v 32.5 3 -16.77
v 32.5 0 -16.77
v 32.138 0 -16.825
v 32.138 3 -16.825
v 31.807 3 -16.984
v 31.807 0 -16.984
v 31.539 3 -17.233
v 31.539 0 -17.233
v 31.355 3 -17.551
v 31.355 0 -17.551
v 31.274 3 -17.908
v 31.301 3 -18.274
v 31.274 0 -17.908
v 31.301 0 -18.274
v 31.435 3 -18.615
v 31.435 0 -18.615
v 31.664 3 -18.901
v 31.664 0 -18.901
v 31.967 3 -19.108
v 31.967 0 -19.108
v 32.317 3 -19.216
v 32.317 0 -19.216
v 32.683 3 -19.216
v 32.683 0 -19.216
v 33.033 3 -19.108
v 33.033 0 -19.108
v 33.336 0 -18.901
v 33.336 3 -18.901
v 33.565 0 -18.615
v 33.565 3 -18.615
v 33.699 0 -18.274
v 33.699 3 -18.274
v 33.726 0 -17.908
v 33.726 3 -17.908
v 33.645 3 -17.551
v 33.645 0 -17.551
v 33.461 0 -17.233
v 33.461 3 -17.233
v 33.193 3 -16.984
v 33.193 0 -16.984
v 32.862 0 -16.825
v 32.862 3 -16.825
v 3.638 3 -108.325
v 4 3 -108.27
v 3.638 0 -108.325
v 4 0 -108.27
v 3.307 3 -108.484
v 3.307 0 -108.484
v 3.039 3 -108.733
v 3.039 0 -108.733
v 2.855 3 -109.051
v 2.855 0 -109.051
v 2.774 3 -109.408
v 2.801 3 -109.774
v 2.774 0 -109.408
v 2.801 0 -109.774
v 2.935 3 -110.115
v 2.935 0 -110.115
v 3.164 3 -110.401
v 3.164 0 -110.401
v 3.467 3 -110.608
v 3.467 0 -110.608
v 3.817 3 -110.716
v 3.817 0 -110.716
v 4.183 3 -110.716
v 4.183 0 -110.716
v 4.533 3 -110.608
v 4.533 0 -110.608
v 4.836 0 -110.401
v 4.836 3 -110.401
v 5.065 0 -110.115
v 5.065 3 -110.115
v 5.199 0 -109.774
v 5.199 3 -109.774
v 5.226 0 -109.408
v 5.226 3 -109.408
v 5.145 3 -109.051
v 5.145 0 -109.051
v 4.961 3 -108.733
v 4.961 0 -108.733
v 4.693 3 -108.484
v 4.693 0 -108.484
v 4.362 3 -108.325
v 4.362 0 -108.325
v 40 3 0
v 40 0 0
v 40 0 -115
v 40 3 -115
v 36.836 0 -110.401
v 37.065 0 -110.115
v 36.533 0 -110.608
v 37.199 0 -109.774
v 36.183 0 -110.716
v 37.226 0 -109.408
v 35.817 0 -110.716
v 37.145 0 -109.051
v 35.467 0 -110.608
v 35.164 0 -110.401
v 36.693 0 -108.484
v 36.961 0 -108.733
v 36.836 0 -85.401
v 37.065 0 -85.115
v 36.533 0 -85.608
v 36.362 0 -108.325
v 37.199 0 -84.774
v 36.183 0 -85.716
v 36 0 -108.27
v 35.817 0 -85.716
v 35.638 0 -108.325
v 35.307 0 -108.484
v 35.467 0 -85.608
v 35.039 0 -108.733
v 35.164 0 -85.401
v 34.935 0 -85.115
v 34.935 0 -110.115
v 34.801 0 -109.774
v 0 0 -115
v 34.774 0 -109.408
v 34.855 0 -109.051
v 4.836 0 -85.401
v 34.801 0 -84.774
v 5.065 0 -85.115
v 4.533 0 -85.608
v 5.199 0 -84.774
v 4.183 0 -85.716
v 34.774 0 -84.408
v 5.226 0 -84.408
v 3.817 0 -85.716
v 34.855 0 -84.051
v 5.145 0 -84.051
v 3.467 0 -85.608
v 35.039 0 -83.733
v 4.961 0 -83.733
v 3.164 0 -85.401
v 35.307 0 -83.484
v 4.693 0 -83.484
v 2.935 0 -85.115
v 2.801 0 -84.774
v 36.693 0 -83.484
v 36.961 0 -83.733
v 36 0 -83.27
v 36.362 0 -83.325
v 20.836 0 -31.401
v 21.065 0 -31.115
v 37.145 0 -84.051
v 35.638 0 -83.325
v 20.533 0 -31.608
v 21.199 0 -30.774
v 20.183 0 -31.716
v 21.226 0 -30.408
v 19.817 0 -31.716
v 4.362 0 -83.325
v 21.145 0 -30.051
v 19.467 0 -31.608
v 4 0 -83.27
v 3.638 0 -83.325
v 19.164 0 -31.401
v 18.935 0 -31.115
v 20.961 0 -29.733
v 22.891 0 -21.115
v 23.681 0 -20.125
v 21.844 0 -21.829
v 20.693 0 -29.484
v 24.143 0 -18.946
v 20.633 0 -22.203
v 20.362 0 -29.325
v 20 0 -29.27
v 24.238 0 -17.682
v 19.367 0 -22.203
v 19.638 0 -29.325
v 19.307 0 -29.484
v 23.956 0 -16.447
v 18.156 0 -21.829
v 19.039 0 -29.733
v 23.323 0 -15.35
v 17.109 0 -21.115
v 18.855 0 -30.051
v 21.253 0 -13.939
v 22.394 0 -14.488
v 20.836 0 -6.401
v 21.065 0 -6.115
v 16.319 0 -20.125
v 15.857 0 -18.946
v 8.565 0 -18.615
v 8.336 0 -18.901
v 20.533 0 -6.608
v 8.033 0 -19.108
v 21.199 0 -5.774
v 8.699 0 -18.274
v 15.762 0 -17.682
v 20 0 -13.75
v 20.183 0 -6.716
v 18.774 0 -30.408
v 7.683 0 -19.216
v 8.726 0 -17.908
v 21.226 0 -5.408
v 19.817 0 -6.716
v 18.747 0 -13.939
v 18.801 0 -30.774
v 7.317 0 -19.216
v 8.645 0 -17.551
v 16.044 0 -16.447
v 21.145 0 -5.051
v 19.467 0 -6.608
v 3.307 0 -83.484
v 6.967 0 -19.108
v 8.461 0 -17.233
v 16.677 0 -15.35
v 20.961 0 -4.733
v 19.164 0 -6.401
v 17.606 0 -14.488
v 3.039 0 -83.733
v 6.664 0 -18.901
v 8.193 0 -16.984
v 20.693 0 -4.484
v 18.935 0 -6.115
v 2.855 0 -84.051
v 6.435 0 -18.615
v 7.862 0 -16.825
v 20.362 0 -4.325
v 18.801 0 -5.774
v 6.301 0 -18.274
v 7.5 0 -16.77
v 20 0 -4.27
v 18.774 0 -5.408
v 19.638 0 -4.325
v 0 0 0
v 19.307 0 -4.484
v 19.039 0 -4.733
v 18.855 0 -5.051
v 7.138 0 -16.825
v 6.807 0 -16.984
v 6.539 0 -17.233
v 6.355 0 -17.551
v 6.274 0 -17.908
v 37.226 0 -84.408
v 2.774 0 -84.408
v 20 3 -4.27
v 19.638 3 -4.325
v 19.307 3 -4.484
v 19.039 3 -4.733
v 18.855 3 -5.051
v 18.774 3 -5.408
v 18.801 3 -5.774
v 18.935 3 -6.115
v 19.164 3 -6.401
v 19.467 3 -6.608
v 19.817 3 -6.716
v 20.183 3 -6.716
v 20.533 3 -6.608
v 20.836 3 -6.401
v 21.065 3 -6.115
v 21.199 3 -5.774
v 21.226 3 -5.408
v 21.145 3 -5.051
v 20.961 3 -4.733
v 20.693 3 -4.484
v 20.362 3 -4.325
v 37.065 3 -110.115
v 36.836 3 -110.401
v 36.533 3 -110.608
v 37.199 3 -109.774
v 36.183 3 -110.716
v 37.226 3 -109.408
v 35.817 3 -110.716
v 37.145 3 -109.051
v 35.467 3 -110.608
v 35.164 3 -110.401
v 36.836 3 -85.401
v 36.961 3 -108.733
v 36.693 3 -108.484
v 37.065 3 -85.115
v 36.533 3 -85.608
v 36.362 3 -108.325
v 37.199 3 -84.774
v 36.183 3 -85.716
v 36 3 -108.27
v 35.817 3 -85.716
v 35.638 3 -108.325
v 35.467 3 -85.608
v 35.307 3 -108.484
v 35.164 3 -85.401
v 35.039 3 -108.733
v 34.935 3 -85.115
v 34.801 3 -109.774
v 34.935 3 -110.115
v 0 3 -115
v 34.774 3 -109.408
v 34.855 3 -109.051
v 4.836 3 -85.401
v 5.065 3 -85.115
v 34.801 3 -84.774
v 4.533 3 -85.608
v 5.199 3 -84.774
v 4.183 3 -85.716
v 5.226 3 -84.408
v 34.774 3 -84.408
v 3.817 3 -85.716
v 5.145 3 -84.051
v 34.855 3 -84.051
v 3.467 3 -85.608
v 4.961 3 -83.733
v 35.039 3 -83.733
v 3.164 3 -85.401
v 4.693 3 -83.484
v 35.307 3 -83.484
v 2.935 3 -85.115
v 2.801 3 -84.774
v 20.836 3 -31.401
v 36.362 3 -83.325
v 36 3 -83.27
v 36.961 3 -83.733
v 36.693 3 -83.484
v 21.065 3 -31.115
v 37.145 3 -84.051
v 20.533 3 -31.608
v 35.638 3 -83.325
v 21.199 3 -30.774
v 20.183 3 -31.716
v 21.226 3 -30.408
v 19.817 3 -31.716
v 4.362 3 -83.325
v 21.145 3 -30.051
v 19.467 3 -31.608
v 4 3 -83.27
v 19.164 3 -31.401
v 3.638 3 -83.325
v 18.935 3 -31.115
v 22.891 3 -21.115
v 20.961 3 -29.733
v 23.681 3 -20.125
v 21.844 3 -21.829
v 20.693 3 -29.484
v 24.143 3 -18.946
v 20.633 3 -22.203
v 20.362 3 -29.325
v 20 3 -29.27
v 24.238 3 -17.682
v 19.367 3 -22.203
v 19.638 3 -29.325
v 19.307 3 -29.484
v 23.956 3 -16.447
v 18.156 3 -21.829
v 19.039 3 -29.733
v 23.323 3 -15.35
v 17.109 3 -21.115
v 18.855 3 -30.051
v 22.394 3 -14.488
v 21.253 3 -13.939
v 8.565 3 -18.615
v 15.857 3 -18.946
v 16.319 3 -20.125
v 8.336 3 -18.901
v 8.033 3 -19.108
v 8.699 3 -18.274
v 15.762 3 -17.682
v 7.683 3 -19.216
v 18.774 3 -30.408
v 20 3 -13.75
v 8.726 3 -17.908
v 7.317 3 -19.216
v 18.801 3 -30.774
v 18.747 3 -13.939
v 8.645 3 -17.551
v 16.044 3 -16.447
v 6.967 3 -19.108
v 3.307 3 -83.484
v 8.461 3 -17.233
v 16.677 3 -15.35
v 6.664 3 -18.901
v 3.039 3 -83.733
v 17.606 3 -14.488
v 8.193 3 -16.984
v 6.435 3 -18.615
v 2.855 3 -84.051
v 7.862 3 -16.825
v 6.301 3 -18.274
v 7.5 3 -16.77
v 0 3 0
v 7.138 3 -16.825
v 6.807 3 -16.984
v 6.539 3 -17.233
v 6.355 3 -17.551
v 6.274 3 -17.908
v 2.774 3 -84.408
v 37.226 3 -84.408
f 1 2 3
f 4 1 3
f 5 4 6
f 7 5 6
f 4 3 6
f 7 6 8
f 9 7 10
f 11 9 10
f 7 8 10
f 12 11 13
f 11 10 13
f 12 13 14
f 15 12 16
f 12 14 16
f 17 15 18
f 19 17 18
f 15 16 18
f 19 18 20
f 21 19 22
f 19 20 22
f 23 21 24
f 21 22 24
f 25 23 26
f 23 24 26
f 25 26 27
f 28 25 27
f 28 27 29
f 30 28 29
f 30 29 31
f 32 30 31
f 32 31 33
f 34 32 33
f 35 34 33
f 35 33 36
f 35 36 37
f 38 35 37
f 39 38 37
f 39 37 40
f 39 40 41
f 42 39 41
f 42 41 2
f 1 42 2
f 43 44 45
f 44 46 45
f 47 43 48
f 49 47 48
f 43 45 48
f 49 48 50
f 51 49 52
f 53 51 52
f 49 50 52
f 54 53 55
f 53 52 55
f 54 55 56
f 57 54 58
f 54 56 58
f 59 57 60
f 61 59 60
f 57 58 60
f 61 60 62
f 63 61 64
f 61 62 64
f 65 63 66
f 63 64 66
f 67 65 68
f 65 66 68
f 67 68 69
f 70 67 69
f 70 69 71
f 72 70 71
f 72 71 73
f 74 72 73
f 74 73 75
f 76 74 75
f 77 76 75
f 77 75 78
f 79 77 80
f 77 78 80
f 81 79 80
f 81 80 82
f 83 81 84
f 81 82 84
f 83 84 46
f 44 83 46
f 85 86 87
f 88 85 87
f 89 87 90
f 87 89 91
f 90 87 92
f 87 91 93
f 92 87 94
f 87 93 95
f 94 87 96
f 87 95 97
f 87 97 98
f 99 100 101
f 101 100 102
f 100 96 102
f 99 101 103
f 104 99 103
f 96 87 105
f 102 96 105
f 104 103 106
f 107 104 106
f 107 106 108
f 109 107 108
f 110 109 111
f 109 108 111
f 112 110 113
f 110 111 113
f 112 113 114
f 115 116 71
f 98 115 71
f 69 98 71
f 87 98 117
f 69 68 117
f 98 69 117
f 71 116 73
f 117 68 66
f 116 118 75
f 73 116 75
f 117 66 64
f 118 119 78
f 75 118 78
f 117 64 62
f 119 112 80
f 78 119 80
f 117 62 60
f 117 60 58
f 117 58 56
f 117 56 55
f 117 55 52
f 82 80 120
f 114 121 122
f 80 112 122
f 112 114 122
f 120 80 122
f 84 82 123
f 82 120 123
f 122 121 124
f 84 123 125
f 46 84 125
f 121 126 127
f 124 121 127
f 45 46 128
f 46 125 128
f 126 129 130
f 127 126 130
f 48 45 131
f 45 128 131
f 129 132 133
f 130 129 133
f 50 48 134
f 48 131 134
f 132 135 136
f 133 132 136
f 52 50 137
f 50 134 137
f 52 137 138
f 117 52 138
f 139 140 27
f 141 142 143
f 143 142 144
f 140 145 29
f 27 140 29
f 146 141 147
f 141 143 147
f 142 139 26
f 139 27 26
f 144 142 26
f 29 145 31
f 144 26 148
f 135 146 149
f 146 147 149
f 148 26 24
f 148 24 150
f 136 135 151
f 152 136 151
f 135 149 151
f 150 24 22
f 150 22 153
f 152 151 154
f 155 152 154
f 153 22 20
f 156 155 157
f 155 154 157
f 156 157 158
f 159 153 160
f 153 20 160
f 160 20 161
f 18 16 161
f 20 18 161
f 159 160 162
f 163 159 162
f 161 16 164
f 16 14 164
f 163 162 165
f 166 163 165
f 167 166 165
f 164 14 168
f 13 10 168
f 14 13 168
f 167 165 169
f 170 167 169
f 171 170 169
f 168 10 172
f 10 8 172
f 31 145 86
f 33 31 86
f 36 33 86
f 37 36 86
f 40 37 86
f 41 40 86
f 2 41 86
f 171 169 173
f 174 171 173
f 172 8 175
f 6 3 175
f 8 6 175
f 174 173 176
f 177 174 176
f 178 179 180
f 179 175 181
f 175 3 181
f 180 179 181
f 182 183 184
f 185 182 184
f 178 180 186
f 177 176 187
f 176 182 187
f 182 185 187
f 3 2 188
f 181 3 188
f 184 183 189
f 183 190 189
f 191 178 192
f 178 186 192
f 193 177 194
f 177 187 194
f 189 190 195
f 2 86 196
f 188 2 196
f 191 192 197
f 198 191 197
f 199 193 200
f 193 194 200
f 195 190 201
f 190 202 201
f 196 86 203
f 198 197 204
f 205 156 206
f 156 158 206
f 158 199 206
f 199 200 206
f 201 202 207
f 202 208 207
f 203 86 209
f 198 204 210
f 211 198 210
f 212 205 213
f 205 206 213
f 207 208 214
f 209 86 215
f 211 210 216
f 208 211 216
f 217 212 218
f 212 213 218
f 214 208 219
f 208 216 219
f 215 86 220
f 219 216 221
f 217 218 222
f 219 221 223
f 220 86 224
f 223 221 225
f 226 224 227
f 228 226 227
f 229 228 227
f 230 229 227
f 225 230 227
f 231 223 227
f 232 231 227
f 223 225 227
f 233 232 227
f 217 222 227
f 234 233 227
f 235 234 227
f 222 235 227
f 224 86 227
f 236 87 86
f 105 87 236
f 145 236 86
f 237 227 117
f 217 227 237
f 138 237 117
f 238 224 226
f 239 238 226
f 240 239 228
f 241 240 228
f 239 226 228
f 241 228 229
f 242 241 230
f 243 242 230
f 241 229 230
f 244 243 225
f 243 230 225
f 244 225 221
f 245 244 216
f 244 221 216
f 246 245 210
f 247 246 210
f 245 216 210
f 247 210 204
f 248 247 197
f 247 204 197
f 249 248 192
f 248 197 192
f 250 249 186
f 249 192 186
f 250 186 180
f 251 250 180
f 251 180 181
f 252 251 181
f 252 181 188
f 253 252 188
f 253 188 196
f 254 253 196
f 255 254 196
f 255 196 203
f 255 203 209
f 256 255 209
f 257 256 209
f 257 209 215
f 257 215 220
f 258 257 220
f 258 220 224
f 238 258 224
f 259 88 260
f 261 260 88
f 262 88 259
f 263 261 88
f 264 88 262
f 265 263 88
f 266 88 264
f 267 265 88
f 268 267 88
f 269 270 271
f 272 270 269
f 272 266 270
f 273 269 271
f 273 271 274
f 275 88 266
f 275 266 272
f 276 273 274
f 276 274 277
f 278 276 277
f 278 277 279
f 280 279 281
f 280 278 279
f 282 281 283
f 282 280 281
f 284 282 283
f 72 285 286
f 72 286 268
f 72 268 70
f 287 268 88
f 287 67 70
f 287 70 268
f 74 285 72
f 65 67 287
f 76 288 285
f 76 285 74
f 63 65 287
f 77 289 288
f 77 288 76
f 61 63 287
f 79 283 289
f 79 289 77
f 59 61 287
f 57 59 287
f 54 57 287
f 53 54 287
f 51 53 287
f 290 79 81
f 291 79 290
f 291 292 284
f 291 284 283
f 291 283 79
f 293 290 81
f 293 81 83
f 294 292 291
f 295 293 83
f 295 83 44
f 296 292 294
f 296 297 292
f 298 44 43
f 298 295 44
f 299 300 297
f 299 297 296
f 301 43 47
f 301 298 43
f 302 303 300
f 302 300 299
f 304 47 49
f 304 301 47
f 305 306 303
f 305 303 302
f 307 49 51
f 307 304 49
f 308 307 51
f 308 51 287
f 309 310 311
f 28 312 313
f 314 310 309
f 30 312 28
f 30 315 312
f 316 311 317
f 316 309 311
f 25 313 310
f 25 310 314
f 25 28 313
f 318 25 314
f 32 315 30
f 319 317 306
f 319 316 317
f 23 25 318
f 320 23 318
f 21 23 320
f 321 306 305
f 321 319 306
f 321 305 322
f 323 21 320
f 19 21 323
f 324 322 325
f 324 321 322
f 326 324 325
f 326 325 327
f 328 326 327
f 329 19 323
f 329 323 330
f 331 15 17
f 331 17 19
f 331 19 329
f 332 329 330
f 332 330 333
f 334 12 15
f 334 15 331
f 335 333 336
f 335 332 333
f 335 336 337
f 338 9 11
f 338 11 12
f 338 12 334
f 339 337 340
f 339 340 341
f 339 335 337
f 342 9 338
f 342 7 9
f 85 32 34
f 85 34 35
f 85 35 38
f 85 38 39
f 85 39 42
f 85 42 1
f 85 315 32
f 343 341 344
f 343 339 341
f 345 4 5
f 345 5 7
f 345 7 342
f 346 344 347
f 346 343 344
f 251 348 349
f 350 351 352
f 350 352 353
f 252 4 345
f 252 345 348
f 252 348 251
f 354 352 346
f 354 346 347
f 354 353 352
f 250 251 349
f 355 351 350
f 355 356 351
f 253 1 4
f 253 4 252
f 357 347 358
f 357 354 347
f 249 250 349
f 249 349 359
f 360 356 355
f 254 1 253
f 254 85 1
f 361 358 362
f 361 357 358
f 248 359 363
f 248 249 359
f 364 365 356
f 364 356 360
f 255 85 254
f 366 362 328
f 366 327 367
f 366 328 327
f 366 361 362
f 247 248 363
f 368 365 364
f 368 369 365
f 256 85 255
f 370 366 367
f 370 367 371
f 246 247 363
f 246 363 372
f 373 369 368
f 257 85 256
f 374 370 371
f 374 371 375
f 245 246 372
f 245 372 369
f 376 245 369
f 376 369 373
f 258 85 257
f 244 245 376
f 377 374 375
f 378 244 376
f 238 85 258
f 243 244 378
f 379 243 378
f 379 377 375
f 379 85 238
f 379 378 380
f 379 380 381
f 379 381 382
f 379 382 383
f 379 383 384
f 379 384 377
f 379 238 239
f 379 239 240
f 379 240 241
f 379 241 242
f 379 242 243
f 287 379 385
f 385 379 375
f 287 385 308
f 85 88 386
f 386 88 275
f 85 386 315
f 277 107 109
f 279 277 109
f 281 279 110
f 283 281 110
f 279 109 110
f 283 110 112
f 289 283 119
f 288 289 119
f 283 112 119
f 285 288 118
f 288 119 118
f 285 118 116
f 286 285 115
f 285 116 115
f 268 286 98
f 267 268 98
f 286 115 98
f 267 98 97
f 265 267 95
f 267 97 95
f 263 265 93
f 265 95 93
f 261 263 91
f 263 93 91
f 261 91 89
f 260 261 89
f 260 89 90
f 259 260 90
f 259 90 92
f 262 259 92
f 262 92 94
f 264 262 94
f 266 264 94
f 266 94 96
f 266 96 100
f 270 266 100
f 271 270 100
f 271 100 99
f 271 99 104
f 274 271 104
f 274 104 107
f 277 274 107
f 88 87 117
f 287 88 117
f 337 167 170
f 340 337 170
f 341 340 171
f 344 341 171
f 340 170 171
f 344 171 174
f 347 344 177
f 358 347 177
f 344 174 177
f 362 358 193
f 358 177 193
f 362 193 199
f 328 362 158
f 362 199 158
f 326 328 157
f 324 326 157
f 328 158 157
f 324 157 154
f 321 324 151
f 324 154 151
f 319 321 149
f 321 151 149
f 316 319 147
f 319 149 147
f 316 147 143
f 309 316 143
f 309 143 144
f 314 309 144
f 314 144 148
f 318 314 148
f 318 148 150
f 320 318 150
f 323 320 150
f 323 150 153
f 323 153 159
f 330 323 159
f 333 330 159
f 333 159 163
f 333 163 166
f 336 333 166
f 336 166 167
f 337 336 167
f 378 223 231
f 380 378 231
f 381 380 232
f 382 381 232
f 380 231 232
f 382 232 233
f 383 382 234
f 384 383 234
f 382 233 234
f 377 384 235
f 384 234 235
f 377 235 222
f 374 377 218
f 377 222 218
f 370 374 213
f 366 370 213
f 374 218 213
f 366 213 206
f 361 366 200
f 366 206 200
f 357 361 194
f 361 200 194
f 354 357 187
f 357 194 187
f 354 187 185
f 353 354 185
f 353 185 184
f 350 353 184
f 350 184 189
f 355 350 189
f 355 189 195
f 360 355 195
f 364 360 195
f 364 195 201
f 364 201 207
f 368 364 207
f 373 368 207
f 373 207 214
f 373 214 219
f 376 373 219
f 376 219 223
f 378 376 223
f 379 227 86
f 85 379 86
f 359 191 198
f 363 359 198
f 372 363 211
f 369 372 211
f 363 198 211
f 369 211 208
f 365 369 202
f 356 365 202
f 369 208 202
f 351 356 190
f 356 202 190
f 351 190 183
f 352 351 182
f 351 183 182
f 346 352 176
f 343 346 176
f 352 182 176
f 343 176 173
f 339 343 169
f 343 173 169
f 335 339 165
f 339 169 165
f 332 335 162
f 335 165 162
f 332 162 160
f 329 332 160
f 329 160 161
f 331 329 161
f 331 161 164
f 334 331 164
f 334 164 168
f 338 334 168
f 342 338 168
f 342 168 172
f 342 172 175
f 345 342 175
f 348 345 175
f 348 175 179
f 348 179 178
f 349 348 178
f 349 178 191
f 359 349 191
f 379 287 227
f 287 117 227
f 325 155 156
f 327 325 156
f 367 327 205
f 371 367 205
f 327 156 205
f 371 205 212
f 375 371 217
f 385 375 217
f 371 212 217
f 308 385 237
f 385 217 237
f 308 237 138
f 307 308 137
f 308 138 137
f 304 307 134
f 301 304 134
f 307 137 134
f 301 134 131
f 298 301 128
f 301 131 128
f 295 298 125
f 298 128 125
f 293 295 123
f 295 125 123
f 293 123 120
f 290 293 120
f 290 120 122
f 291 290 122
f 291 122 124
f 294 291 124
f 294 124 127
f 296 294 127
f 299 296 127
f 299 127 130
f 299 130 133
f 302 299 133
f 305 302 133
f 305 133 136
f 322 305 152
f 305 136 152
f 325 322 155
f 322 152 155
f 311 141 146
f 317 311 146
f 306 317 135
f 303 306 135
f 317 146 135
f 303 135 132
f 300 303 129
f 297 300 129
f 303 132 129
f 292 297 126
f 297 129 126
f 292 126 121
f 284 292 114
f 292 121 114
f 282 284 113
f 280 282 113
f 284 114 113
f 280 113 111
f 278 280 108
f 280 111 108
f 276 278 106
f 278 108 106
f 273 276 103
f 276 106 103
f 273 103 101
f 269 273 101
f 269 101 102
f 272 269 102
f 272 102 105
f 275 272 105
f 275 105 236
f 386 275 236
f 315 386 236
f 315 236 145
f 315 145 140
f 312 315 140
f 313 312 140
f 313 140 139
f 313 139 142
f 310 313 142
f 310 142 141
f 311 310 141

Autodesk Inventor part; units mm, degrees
ref_plane "YZ Plane" through (0, 0, 0) normal (1, 0, 0) x (0, 1, 0)
ref_plane "XZ Plane" through (0, 0, 0) normal (0, 1, 0) x (-1, 0, 0)
ref_plane "XY Plane" through (0, 0, 0) normal (0, 0, 1) x (1, 0, 0)
sketch "スケッチ1" plane through (0, 0, 0) normal (0, 1, 0) x (-1, 0, 0)
  line L0 (0, 0) -> (-40, 0)
  line L1 (-40, 0) -> (-40, -115)
  line L2 (-40, -115) -> (0, -115)
  line L3 (0, -115) -> (0, 0)
  dimension "d0" = 40
  dimension "d1" = 115
extrude "押し出し1" add sketch "スケッチ1" along normal blind 3
sketch "スケッチ2" plane through (0, 3, 0) normal (0, 1, 0) x (1, 0, 0)
  line L0 (0, 0) -> (40, 0) construction
  line L1 (20, 0) -> (20, 115) construction
  line L2 (40, 115) -> (0, 115) construction
  point P0 (20, 18)
  dimension "d4" = 18
hole "穴1" at (20, 3, -18) direction (0, -1, 0) diameter 8.5 end through all
sketch "スケッチ3" plane through (0, 3, 0) normal (0, 1, 0) x (1, 0, 0)
  circle A0 centre (20, 18) radius 4.25 construction
  circle A1 centre (20, 18) radius 12.5 construction
  point P0 (0, 0)
  point P1 (7.5, 18)
  point P2 (20, 5.5)
  point P3 (32.5, 18)
  point P4 (20, 30.5)
  dimension "d12" = 25
  dimension "d15" = 360
hole "穴2" at (7.5, 3, -18) at (20, 3, -5.5) at (32.5, 3, -18) at (20, 3, -30.5) direction (0, -1, 0) diameter 2.459 end through all thread size "M3x0.5" class "6H" standard "ISO Metric profile"
sketch "スケッチ4" plane through (0, 3, 0) normal (0, 1, 0) x (1, 0, 0)
  line L0 (40, 115) -> (0, 115) construction
  line L1 (0, 115) -> (40, 115) construction
  line L2 (40, 115) -> (40, 110) construction
  line L3 (40, 110) -> (0, 110) construction
  line L4 (0, 110) -> (0, 115) construction
  line L5 (0, 115) -> (0, 0) projected
  line L6 (0, 112.5) -> (40, 112.5) construction
  line L7 (40, 0) -> (40, 115) projected
  line L8 (0, 115) -> (0, 0) construction
  line L9 (40, 85) -> (0, 85) construction
  line L10 (0, 85) -> (0, 90) construction
  line L11 (0, 90) -> (40, 90) construction
  line L12 (40, 90) -> (40, 85) construction
  line L13 (40, 87.5) -> (0, 87.5) construction
  point P0 (4, 112.5)
  point P1 (36, 112.5)
  point P2 (36, 87.5)
  point P3 (4, 87.5)
  dimension "d25" = 5
  dimension "d26" = 4
  dimension "d27" = 4
  dimension "d35" = 5
  dimension "d36" = 25
hole "穴3" [suppressed]
sketch "スケッチ5" plane through (0, 3, 0) normal (0, 1, 0) x (1, 0, 0)
  line L0 (36, 84.5) -> (4, 84.5) construction
  line L1 (4, 84.5) -> (4, 109.5) construction
  line L2 (4, 109.5) -> (36, 109.5) construction
  line L3 (36, 109.5) -> (36, 84.5) construction
  line L4 (40, 0) -> (40, 115) construction
  line L5 (0, 115) -> (0, 0) construction
  line L6 (40, 115) -> (0, 115) construction
  dimension "d37" = 4
  dimension "d38" = 4
  dimension "d39" = 5.5
  dimension "d40" = 25
hole "穴4" at (36, 3, -84.5) at (36, 3, -109.5) at (4, 3, -109.5) at (4, 3, -84.5) direction (0, -1, 0) diameter 2.459 end through all thread size "M3x0.5" class "6H" standard "ISO Metric profile"
properties part number "shoulder1_upper_cover" material "アルミニウム 5052"
